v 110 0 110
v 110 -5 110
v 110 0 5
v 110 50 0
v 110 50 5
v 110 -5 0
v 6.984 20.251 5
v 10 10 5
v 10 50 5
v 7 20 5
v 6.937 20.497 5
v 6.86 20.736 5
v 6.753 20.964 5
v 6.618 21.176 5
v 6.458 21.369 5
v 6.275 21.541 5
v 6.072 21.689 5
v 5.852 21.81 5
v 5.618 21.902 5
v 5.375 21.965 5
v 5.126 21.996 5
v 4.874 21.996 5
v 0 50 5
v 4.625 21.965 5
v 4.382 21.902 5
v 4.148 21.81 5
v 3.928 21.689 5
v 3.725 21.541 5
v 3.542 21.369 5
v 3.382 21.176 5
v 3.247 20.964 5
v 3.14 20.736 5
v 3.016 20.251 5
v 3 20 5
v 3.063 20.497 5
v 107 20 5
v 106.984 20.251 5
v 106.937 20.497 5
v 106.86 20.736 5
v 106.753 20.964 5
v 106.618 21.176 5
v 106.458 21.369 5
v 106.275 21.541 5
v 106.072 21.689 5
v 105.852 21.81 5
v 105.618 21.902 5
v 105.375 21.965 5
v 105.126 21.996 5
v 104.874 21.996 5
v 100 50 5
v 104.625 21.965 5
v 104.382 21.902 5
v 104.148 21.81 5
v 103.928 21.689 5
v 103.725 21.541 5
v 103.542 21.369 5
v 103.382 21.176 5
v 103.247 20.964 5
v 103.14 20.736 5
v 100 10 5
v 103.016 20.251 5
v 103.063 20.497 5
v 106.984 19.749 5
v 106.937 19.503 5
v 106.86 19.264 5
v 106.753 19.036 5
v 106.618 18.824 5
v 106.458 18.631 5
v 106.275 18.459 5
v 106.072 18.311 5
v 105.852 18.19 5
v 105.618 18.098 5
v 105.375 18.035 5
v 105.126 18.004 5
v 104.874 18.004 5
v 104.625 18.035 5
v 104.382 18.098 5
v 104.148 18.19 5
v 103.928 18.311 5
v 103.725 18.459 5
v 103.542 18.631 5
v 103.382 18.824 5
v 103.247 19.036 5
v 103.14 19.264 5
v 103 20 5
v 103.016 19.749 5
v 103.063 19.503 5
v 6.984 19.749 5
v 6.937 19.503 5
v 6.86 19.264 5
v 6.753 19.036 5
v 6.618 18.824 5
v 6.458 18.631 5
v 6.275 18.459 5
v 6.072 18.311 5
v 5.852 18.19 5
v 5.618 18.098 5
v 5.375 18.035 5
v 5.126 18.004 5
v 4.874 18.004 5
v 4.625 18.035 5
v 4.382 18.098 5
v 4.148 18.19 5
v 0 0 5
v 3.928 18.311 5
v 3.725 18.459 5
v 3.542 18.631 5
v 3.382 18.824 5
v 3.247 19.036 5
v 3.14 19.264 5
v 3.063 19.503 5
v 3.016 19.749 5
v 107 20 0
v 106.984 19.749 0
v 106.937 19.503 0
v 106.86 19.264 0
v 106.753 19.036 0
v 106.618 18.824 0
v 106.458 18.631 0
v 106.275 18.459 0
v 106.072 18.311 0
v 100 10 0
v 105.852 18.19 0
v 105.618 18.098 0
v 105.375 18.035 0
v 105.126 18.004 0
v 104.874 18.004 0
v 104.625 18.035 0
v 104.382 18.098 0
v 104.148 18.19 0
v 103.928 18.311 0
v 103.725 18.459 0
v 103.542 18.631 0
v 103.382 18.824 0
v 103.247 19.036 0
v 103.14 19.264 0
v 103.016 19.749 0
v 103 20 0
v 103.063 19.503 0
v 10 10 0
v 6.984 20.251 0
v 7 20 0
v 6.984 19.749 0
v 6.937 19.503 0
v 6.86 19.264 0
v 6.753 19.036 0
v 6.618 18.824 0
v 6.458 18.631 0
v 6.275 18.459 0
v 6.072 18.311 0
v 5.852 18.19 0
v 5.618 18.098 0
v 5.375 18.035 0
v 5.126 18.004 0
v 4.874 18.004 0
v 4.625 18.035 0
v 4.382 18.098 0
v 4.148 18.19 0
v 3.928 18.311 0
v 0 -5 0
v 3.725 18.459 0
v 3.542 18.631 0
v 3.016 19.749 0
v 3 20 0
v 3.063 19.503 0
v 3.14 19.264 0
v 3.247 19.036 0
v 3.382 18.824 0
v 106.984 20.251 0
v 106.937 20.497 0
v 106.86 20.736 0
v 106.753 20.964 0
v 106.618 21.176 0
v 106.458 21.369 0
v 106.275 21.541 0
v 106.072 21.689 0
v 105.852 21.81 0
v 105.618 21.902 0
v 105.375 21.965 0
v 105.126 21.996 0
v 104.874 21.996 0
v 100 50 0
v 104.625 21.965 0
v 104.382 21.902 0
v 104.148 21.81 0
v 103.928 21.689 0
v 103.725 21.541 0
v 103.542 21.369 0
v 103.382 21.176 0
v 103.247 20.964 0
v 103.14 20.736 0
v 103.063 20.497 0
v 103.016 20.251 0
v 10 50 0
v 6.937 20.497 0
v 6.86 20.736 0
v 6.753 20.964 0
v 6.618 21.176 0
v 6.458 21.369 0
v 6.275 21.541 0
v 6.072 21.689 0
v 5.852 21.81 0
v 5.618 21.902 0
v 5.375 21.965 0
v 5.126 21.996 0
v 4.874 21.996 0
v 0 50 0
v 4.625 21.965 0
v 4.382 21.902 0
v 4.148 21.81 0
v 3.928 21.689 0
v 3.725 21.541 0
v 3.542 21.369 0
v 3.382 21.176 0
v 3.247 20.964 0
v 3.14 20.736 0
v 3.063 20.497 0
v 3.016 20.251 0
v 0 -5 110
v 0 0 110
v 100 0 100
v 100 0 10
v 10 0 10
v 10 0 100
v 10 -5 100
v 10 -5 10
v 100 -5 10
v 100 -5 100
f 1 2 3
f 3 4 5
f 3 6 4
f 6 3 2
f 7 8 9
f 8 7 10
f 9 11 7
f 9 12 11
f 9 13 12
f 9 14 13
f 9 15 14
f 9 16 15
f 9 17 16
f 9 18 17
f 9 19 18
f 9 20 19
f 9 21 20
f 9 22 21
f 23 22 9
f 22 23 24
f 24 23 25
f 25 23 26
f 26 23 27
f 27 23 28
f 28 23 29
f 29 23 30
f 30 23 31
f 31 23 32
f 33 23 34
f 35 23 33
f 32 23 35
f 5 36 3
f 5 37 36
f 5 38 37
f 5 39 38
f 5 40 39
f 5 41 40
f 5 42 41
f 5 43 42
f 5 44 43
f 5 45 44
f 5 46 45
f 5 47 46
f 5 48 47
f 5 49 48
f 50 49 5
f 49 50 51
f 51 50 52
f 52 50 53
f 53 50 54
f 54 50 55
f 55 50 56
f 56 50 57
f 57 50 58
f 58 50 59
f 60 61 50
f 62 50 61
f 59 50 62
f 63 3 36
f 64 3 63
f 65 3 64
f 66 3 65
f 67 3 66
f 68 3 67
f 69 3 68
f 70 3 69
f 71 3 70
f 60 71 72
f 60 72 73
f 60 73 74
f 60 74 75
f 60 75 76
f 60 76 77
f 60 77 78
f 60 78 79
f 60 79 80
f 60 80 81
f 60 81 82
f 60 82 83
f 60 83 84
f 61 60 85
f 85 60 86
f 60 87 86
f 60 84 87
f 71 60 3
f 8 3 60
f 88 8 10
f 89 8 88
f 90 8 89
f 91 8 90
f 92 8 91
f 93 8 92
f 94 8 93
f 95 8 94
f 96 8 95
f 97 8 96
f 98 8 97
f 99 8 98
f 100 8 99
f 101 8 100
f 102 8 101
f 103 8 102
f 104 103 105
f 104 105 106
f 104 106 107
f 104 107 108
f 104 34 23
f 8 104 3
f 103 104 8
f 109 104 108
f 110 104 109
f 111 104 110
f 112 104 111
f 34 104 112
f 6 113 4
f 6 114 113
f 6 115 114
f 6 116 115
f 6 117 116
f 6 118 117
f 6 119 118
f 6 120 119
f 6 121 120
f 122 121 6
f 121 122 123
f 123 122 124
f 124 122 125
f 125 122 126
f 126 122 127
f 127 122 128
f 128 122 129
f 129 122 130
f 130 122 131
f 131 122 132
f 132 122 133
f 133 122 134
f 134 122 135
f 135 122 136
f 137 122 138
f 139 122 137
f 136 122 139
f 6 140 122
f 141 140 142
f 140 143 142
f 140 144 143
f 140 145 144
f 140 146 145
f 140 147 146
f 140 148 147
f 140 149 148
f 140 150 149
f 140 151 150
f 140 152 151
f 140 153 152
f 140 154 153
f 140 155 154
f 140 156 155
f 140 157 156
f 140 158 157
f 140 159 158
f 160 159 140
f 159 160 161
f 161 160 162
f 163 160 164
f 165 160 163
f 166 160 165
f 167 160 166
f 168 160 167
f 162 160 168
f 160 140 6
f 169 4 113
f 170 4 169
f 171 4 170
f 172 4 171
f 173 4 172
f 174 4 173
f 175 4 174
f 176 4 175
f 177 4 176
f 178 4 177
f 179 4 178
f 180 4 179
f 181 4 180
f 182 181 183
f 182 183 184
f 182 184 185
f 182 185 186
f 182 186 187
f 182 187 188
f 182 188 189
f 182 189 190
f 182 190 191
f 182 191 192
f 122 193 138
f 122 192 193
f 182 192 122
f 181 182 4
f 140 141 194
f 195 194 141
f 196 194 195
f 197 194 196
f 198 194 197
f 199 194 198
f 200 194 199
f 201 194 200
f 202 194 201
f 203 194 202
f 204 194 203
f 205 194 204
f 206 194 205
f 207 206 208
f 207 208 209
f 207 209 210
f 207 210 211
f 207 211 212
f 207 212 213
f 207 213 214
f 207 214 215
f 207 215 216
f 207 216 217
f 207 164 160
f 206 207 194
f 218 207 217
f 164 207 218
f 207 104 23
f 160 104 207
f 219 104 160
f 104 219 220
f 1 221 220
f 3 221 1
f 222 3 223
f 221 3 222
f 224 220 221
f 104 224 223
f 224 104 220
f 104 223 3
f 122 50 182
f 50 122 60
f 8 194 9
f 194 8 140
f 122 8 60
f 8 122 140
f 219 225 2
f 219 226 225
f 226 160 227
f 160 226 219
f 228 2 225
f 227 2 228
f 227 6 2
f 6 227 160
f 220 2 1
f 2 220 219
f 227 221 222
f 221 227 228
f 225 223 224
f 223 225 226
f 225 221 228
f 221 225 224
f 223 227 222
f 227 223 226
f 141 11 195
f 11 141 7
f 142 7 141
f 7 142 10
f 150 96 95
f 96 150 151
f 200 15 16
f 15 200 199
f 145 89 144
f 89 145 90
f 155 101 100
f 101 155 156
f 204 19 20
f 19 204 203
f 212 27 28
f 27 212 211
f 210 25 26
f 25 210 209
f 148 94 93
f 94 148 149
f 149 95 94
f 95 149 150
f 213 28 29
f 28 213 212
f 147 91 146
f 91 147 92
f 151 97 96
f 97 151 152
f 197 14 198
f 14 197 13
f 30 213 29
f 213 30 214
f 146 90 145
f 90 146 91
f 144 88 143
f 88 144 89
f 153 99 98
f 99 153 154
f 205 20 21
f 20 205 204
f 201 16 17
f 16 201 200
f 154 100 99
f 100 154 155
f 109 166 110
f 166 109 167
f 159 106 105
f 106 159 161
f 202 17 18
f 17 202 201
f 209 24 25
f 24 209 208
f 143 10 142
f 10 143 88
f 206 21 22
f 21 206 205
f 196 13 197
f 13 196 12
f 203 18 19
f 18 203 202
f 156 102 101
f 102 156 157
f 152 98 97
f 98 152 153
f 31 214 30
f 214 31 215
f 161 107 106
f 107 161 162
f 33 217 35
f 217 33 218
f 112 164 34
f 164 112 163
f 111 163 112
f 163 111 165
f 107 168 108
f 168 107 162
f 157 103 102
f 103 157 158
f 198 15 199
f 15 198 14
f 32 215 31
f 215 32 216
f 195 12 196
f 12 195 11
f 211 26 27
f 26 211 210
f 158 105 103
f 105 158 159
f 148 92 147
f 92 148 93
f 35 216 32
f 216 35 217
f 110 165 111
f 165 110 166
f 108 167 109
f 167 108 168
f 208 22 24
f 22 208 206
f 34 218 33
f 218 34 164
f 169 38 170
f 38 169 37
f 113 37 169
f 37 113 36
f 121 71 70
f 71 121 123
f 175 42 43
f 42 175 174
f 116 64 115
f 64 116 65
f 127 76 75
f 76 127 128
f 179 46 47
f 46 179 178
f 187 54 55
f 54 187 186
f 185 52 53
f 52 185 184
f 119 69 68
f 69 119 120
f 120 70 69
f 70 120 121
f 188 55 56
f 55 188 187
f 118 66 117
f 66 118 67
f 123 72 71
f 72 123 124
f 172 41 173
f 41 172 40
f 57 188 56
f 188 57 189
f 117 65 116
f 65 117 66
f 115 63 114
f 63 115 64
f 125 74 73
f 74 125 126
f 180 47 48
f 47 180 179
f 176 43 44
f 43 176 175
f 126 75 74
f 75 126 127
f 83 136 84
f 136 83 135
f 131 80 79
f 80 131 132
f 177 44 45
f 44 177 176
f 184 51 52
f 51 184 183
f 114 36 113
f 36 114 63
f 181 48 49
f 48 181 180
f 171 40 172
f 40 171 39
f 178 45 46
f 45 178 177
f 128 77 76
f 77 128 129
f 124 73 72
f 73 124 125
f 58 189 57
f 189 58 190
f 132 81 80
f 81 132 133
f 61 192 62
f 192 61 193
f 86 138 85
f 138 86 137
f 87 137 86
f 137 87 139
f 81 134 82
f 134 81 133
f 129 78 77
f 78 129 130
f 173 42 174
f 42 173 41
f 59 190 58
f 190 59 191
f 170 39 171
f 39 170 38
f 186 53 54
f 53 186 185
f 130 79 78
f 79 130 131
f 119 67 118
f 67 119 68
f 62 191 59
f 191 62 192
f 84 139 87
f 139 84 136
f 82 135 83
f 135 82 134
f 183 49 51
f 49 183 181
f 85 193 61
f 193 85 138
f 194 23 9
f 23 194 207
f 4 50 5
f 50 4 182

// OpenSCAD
$fn=50;
XX=110;
YY=110;
DD=5;

module flat(dy) {
  vv=10;
  difference() {
      cube([XX,YY,DD]);
      translate([vv,vv,0]) cube([XX-2*vv,YY-2*vv,DD]);
  }
}

module main() {
  difference() {
    union() {
      flat(2);
      rotate([90,0,0]) flat(1);
    }
    #translate([5,20,0]) cylinder(DD,d=4);
    #translate([XX-5,20,0]) cylinder(DD,d=4);
  }
  # translate([0,-7,0]) cube([5,5,YY]);
  # translate([XX-5,0,0]) translate([0,-7,0]) cube([5,5,YY]);
}
module main2() {
  difference() {
    union() {
      flat(2);
      rotate([90,0,0]) flat(1);
    }
    #translate([5,20,0]) cylinder(DD,d=4);
    #translate([XX-5,20,0]) cylinder(DD,d=4);
    translate([0,50,0]) cube([XX,YY,DD]);
  }
  //# translate([0,-7,0]) cube([5,5,YY]);
  //# translate([XX-5,0,0]) translate([0,-7,0]) cube([5,5,YY]);
}


main2();
